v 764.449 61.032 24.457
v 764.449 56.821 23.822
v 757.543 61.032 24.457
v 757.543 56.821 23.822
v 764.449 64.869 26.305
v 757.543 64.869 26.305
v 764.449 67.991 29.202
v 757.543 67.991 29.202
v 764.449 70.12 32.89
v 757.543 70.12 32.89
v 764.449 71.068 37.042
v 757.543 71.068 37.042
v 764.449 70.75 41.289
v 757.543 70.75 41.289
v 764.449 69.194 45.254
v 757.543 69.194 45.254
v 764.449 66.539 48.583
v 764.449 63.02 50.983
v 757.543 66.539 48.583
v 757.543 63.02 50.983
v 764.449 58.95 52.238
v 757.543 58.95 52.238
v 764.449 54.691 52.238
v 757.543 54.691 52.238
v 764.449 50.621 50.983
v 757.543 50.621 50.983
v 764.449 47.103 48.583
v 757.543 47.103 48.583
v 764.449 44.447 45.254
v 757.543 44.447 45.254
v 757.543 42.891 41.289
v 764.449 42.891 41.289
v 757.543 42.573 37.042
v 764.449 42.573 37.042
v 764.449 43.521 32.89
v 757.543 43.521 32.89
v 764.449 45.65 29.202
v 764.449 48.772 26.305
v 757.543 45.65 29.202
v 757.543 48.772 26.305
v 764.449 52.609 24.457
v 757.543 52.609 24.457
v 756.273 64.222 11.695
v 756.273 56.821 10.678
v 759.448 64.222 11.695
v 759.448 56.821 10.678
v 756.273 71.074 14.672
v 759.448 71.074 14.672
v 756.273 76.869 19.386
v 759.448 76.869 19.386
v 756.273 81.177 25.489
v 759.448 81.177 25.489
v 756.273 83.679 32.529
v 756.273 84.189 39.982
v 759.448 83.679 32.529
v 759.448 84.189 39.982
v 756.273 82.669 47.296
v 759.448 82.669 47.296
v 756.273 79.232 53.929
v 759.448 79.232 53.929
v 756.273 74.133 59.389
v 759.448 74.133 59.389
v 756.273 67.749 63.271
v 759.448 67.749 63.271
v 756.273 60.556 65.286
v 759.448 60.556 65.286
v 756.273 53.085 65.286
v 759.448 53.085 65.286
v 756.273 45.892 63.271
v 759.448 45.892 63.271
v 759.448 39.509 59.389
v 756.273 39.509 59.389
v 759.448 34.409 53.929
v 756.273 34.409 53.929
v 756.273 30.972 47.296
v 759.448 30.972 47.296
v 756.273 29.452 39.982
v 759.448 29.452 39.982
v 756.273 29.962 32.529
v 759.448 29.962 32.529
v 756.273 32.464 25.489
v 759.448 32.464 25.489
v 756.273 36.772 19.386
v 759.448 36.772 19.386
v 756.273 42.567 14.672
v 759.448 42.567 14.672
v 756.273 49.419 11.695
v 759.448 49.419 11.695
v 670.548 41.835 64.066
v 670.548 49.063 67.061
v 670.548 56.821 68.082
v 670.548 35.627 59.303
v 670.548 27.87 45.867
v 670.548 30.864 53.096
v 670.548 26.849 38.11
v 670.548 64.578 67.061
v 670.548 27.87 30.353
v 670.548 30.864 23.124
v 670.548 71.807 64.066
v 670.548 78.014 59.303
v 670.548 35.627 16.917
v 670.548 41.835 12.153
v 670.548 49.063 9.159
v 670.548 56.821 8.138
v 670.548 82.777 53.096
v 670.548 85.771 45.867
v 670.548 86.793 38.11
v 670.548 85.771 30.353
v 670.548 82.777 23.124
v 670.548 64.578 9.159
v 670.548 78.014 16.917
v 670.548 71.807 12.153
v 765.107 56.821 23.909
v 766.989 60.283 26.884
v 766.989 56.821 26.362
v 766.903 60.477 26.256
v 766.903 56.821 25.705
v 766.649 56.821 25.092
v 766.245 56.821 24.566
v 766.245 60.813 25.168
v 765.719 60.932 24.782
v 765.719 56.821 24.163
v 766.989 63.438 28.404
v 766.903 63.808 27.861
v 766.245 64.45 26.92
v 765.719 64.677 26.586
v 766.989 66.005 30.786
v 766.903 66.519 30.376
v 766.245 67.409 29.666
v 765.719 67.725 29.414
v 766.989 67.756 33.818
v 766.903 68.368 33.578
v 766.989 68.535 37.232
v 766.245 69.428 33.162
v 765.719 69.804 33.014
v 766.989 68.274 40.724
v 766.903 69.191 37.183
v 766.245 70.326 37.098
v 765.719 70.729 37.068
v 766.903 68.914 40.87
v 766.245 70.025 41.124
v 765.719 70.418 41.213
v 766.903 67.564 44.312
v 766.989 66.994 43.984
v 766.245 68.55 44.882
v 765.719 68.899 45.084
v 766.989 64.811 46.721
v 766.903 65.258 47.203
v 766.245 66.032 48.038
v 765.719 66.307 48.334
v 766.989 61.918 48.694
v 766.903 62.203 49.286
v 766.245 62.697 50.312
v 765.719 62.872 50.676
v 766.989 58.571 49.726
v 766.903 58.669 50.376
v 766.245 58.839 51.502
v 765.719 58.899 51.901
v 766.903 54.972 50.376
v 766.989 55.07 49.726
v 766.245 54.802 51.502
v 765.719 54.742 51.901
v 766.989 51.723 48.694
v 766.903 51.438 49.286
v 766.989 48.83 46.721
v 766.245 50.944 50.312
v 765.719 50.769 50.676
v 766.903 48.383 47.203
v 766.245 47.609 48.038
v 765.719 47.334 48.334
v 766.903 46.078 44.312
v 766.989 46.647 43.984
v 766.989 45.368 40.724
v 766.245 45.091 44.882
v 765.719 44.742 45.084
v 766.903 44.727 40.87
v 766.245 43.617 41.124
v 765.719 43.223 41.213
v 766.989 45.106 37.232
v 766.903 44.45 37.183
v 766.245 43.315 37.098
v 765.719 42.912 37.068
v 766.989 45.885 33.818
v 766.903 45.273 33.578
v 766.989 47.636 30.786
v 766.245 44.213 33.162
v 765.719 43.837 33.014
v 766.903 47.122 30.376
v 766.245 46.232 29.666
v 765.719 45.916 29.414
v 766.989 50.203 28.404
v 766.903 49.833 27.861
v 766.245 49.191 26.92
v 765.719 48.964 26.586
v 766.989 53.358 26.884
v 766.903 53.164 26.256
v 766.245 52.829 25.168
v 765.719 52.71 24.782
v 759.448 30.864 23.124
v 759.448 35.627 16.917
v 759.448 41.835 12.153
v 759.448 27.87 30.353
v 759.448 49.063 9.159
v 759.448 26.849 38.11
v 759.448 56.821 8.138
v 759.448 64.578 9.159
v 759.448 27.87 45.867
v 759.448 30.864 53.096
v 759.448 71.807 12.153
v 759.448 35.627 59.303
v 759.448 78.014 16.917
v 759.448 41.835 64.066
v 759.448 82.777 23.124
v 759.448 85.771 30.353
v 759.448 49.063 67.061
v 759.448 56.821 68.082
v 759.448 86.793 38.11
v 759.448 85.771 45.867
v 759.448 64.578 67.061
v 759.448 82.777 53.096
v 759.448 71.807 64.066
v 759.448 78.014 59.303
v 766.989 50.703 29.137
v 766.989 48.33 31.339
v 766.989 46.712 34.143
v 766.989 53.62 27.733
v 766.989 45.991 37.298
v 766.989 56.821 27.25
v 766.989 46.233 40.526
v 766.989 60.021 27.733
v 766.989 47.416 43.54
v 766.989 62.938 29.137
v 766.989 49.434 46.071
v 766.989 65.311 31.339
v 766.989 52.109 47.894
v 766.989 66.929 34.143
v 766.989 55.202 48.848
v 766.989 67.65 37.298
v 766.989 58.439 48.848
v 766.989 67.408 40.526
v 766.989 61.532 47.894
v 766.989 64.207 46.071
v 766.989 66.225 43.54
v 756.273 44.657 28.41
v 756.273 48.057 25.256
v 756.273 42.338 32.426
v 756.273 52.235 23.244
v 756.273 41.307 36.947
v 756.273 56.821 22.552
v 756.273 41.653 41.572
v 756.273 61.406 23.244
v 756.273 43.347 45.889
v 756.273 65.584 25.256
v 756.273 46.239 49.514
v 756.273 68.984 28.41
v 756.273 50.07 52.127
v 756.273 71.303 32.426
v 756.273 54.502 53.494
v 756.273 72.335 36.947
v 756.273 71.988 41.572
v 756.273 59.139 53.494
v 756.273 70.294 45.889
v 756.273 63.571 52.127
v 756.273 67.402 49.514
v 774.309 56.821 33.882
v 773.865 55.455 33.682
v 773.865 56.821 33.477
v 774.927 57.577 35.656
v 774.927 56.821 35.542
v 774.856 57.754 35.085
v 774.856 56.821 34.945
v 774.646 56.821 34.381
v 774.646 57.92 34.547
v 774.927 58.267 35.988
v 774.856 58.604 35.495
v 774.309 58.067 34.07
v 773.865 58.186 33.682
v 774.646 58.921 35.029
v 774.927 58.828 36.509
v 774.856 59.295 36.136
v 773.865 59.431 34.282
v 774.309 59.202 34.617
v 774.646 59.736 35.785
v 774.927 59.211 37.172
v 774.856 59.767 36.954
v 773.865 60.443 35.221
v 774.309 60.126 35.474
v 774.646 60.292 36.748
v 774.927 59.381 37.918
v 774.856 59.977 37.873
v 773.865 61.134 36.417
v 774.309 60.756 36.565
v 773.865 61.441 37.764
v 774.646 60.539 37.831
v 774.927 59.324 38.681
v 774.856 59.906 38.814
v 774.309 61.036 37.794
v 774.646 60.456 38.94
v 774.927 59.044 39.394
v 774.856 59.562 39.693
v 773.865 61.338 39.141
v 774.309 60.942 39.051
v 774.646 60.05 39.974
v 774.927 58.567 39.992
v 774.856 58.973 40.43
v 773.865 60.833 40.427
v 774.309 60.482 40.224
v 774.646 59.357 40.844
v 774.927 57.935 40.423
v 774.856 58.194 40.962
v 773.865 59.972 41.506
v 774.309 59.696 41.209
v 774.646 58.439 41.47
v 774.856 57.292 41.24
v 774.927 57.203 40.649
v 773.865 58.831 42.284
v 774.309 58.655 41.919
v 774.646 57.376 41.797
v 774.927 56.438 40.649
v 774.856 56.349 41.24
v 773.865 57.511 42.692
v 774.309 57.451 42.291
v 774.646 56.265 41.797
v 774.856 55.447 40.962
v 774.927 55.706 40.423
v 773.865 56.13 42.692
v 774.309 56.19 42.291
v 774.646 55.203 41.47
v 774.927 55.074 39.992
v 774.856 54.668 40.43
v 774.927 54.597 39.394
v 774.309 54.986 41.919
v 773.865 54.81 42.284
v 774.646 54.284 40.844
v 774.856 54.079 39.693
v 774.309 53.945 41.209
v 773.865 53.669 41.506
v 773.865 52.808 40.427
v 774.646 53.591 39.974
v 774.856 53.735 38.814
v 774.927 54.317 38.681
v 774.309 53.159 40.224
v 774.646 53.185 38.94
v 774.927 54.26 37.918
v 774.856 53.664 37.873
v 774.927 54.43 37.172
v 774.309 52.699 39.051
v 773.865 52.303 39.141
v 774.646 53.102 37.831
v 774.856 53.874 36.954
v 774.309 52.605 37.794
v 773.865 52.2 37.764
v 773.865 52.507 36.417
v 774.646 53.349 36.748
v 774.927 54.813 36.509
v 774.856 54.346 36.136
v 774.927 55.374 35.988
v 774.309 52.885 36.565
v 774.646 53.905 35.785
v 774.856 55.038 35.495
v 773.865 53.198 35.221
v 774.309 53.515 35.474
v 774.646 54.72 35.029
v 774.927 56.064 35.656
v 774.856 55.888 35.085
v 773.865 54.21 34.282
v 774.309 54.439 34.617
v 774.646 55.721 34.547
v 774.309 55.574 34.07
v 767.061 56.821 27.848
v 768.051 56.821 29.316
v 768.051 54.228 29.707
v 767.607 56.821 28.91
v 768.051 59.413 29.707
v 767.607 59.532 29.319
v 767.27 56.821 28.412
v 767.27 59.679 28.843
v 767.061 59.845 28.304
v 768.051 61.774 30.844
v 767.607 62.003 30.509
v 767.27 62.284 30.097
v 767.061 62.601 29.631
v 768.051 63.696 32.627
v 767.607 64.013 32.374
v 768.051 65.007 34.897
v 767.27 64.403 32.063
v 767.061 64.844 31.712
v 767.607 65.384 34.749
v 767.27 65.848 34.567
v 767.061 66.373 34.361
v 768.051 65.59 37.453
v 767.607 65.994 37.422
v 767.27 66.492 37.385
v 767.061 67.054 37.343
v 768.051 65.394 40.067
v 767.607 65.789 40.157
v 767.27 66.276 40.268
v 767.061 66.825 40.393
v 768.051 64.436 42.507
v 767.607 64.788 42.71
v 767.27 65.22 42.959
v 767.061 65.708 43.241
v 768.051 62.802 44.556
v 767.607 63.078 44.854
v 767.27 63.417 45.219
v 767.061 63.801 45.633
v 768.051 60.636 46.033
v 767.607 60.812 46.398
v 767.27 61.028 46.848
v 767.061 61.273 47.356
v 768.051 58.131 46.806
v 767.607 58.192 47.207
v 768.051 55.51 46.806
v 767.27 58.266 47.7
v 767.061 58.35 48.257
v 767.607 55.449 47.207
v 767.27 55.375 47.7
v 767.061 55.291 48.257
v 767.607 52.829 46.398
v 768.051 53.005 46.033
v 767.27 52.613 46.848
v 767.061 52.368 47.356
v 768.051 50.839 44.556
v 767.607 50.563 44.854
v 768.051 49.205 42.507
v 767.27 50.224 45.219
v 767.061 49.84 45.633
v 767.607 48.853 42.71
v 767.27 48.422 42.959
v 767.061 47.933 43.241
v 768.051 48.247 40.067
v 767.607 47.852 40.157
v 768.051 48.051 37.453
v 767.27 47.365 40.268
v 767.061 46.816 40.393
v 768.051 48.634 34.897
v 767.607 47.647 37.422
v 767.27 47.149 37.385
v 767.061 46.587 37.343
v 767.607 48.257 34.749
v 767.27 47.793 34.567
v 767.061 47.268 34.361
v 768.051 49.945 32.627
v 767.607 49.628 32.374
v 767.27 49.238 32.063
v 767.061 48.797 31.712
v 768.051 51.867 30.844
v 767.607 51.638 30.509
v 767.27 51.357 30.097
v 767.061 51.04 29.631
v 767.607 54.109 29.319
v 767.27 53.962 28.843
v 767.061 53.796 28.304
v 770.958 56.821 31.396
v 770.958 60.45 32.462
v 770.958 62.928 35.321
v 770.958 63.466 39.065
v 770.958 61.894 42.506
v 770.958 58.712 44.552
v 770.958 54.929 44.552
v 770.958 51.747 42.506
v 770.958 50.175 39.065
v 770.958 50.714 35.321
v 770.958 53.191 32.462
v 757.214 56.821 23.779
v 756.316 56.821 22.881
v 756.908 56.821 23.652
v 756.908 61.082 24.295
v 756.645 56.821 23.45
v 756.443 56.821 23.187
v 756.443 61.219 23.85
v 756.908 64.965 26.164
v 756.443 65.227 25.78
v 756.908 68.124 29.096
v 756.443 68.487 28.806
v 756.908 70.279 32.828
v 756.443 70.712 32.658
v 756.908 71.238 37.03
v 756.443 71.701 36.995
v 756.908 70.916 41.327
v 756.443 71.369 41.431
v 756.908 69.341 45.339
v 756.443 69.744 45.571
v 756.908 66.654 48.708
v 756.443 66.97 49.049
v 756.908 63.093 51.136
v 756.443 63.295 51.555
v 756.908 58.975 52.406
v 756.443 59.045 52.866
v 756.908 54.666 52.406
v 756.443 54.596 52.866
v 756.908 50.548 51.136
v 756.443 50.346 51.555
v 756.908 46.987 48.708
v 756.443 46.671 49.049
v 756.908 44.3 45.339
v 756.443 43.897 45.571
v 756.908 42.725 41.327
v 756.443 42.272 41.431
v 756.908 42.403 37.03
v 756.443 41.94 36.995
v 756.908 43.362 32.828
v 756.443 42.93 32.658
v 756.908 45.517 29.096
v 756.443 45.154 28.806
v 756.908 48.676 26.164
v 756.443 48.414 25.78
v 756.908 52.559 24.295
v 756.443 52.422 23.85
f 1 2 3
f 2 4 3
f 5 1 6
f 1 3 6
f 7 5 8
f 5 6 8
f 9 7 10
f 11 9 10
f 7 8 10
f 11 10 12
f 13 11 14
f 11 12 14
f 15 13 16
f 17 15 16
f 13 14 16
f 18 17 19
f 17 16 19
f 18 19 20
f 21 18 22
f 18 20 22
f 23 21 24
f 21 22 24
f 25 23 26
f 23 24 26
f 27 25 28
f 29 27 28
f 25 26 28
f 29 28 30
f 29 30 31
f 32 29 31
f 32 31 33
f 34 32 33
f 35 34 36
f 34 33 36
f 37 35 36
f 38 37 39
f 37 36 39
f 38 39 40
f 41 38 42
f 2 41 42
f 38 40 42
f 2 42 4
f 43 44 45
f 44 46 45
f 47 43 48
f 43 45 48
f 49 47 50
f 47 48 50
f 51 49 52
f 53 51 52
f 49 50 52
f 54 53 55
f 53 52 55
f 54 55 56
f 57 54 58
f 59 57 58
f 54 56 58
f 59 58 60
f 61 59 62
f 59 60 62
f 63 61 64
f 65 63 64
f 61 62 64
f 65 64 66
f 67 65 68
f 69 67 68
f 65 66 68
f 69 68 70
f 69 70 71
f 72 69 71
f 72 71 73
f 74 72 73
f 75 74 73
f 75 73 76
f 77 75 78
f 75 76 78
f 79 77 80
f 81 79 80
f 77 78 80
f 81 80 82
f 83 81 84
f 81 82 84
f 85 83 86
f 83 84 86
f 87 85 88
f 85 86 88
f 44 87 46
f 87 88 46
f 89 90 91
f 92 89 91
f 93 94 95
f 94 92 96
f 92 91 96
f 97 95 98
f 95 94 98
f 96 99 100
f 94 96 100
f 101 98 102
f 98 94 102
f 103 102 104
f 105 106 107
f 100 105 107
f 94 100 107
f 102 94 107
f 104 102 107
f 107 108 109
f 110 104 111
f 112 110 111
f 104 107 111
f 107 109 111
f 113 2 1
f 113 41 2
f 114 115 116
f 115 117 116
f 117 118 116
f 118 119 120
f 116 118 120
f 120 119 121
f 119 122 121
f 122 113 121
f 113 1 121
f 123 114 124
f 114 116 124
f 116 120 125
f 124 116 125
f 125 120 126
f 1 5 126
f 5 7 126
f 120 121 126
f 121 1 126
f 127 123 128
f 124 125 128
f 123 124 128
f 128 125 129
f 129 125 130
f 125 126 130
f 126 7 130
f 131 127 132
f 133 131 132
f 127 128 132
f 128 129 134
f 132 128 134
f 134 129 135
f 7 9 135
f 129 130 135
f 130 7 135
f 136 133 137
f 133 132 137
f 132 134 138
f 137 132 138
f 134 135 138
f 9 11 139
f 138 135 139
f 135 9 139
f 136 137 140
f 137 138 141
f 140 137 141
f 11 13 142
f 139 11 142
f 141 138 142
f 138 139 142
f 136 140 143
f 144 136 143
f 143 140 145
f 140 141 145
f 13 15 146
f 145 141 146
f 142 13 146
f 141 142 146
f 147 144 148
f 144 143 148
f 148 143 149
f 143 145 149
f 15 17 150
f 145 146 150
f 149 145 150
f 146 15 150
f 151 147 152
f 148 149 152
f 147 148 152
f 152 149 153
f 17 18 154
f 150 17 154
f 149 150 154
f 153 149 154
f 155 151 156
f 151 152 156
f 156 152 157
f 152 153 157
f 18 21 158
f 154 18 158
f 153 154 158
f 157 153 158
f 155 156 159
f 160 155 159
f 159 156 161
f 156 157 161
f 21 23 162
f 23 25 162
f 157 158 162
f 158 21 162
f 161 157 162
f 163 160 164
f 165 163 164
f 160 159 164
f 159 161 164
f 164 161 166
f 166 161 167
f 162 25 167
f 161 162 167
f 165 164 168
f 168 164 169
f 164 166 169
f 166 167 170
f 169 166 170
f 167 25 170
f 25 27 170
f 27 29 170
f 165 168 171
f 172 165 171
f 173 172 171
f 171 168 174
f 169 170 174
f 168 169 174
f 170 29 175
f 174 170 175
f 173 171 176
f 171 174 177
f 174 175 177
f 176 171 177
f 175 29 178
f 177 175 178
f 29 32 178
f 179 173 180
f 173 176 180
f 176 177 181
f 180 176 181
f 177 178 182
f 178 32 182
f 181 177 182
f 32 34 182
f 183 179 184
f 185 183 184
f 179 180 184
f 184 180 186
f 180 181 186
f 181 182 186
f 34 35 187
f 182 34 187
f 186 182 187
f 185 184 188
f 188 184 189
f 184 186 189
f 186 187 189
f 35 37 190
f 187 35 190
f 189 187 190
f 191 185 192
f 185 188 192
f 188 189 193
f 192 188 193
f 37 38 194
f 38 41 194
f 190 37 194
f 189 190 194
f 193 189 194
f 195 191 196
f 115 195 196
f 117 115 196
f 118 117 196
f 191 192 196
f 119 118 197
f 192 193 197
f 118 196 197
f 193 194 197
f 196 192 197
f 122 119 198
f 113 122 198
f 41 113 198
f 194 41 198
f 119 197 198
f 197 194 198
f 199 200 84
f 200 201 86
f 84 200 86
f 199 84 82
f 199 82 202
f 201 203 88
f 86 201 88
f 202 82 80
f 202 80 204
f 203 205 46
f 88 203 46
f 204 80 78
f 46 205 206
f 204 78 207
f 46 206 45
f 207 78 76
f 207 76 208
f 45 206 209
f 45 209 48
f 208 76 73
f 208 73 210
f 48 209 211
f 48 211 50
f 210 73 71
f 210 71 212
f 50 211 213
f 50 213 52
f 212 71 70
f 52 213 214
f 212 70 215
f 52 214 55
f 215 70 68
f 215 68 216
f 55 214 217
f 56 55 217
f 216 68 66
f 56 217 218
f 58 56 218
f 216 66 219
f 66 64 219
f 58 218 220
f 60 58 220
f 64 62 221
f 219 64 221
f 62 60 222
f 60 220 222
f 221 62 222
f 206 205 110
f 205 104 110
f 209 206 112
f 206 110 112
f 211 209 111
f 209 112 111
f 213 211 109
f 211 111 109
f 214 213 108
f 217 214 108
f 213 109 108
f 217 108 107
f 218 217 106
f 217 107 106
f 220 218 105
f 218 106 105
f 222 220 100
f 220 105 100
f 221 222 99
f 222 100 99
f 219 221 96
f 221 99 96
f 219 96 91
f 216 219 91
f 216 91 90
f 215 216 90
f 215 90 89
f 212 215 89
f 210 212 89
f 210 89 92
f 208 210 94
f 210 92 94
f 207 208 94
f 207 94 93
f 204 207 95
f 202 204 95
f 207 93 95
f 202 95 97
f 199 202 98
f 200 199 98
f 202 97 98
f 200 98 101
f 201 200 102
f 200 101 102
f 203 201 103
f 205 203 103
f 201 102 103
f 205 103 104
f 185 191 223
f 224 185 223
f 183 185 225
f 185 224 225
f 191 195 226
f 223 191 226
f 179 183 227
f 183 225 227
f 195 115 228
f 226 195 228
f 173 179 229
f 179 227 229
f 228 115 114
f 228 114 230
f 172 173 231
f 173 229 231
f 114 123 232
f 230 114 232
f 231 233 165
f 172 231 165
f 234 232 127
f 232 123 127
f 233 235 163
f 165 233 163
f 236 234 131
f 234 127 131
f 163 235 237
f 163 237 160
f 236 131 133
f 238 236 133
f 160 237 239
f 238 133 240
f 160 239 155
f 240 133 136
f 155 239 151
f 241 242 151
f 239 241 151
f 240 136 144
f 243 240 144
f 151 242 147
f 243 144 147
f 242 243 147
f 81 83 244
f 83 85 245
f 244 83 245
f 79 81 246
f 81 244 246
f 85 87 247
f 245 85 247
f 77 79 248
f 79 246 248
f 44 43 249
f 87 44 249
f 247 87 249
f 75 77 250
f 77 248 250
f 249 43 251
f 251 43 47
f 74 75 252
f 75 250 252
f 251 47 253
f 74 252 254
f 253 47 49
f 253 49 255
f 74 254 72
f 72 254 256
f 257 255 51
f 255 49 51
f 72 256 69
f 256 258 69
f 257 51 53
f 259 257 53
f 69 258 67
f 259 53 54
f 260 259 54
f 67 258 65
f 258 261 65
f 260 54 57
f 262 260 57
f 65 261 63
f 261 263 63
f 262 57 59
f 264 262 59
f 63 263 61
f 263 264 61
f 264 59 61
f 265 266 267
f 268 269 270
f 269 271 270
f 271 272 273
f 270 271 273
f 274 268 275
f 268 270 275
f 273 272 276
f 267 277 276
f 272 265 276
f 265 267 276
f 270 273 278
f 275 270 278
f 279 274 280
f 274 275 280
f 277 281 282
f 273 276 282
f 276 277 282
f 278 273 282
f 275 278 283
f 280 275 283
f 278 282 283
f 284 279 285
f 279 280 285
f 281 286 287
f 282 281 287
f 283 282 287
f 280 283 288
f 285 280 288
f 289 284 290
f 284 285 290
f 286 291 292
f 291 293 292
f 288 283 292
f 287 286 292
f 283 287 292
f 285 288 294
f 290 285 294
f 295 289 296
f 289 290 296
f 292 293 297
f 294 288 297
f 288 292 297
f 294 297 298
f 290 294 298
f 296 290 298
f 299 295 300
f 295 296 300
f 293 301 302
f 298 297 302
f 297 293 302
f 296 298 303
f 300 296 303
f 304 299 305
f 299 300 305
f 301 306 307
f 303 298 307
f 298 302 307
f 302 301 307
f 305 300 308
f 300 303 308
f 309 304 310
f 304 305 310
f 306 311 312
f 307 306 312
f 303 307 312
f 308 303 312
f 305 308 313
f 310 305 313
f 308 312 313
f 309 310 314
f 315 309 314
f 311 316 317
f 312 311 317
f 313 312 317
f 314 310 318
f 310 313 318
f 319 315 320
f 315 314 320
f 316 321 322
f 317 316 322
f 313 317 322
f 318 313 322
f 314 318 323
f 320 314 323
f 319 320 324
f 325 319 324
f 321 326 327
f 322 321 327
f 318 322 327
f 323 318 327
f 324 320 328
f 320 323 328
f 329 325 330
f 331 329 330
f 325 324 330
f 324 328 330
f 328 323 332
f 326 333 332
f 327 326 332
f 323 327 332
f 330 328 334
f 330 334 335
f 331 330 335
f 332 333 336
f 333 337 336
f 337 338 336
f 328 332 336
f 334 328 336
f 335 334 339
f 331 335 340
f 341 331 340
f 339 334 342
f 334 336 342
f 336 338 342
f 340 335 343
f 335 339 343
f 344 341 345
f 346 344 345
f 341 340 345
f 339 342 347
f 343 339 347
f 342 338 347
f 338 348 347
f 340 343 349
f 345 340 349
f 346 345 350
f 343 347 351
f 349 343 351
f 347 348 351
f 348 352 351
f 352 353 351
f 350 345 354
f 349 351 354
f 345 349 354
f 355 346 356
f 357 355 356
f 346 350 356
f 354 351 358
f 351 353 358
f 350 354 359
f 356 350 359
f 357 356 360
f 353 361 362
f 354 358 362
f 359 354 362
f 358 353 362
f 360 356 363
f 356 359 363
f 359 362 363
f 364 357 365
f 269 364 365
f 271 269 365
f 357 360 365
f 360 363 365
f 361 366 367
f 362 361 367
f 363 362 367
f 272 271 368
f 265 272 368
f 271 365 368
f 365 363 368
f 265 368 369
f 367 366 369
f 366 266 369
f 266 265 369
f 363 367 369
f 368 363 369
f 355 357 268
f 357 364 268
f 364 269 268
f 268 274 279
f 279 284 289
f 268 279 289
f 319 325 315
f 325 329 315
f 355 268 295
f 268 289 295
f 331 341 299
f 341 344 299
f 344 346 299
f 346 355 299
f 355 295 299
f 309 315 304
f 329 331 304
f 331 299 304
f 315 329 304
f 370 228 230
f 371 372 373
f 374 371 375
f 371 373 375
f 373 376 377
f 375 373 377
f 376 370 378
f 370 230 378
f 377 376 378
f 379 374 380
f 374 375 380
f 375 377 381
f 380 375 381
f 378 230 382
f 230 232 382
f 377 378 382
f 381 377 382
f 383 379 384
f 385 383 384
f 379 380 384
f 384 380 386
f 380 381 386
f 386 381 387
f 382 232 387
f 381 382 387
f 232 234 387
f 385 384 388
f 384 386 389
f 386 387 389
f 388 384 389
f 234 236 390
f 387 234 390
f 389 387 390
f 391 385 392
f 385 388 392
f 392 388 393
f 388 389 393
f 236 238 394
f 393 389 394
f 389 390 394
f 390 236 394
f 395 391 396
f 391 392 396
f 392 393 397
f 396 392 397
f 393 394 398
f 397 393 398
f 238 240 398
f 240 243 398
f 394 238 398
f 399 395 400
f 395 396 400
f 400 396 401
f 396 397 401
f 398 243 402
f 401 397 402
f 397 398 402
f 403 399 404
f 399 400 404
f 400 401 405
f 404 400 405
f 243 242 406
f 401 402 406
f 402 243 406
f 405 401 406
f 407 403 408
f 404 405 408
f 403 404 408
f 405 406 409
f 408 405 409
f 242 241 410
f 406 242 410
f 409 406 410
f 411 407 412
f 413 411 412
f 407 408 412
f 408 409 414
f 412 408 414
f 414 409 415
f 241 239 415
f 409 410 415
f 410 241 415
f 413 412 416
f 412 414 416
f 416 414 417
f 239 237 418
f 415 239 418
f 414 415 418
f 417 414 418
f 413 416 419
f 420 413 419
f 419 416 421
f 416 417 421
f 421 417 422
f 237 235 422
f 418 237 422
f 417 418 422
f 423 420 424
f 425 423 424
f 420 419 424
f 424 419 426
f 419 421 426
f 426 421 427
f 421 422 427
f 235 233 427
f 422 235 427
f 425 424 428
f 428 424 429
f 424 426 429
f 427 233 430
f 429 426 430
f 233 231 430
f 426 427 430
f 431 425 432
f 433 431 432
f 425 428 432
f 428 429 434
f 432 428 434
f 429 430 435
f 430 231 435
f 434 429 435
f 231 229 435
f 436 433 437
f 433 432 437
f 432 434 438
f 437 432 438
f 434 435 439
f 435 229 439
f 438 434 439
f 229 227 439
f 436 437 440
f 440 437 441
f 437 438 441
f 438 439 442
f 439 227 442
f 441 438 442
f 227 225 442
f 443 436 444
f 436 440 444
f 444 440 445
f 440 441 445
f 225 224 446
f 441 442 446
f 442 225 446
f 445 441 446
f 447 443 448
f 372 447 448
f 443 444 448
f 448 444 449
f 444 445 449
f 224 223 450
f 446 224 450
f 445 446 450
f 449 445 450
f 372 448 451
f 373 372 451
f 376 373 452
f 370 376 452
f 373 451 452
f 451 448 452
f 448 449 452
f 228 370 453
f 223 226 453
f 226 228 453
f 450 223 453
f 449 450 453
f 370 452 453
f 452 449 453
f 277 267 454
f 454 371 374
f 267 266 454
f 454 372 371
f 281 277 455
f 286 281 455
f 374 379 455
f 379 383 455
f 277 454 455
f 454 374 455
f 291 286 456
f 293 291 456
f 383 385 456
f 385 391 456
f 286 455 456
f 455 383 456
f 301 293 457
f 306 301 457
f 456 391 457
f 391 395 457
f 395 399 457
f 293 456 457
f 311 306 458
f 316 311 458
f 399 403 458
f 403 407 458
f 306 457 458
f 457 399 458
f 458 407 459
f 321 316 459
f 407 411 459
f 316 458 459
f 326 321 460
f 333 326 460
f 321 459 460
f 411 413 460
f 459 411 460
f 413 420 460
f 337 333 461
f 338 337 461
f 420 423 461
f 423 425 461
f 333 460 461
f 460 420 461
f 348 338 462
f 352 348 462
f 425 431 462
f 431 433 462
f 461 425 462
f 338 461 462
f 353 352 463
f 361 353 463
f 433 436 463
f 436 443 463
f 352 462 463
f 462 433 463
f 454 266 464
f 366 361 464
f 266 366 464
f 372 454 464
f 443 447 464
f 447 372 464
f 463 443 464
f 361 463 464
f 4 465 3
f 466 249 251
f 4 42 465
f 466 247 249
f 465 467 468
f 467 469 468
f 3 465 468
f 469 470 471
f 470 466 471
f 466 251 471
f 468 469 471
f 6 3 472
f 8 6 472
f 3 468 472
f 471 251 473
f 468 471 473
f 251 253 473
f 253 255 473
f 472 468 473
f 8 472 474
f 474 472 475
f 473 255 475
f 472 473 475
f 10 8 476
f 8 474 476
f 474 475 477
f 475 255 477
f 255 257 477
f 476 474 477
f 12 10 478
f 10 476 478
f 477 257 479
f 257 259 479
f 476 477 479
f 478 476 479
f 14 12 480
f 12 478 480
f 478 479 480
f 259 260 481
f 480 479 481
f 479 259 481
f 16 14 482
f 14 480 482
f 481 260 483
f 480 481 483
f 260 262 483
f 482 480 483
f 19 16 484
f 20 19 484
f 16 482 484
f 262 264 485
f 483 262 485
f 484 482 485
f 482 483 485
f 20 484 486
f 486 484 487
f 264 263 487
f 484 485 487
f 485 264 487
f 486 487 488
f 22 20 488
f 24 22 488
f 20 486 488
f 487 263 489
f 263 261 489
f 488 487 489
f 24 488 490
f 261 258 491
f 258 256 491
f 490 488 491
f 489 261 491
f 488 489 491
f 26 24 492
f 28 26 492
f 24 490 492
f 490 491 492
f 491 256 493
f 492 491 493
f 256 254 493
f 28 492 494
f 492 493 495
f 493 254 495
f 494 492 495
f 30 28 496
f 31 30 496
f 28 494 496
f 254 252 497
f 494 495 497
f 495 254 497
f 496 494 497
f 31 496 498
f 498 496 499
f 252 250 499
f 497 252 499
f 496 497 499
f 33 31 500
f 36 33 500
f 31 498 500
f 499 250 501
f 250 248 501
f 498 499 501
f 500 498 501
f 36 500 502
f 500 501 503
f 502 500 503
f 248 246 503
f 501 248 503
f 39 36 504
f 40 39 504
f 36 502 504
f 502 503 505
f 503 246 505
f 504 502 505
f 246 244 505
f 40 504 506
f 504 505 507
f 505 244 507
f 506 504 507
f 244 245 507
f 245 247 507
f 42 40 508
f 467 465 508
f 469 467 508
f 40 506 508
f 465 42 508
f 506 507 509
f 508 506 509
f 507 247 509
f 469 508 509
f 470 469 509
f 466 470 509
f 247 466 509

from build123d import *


with BuildPart() as part:
    # Sketch1 → Revolve1 (revolve)
    with BuildSketch(Plane.XY.offset(38.109948098), mode=Mode.PRIVATE) as revolve1_sk:
        with BuildLine():
            Line((670.54800115, 86.792545046), (670.54800115, 56.820545046))
            Line((670.54800115, 56.820545046), (774.926761151, 56.820545046))
            Line((774.926761151, 56.820545046), (774.926761151, 59.38835011))
            ThreePointArc((774.926761151, 59.38835011), (774.645765826, 60.549598522), (773.8649518, 61.453913569))
            Line((773.8649518, 61.453913569), (768.0510705, 65.614533734))
            ThreePointArc((768.0510705, 65.614533734), (767.270256474, 66.518848781), (766.98926115, 67.680097193))
            Line((766.98926115, 67.680097193), (766.98926115, 68.568045046))
            ThreePointArc((766.98926115, 68.568045046), (766.245312374, 70.36409627), (764.44926115, 71.108045046))
            Line((764.44926115, 71.108045046), (757.54300115, 71.108045046))
            ThreePointArc((757.54300115, 71.108045046), (756.644975538, 71.480019434), (756.27300115, 72.378045046))
            Line((756.27300115, 72.378045046), (756.27300115, 84.252545046))
            Line((756.27300115, 84.252545046), (759.44800115, 84.252545046))
            Line((759.44800115, 84.252545046), (759.44800115, 86.792545046))
            Line((759.44800115, 86.792545046), (670.54800115, 86.792545046))
        make_face()
    revolve(revolve1_sk.sketch.rotate(Axis((670.54800115, 56.820545046, 38.109948098), (1, 0, 0)), 270), axis=Axis((670.54800115, 56.820545046, 38.109948098), (1, 0, 0)))


solid = part.part
